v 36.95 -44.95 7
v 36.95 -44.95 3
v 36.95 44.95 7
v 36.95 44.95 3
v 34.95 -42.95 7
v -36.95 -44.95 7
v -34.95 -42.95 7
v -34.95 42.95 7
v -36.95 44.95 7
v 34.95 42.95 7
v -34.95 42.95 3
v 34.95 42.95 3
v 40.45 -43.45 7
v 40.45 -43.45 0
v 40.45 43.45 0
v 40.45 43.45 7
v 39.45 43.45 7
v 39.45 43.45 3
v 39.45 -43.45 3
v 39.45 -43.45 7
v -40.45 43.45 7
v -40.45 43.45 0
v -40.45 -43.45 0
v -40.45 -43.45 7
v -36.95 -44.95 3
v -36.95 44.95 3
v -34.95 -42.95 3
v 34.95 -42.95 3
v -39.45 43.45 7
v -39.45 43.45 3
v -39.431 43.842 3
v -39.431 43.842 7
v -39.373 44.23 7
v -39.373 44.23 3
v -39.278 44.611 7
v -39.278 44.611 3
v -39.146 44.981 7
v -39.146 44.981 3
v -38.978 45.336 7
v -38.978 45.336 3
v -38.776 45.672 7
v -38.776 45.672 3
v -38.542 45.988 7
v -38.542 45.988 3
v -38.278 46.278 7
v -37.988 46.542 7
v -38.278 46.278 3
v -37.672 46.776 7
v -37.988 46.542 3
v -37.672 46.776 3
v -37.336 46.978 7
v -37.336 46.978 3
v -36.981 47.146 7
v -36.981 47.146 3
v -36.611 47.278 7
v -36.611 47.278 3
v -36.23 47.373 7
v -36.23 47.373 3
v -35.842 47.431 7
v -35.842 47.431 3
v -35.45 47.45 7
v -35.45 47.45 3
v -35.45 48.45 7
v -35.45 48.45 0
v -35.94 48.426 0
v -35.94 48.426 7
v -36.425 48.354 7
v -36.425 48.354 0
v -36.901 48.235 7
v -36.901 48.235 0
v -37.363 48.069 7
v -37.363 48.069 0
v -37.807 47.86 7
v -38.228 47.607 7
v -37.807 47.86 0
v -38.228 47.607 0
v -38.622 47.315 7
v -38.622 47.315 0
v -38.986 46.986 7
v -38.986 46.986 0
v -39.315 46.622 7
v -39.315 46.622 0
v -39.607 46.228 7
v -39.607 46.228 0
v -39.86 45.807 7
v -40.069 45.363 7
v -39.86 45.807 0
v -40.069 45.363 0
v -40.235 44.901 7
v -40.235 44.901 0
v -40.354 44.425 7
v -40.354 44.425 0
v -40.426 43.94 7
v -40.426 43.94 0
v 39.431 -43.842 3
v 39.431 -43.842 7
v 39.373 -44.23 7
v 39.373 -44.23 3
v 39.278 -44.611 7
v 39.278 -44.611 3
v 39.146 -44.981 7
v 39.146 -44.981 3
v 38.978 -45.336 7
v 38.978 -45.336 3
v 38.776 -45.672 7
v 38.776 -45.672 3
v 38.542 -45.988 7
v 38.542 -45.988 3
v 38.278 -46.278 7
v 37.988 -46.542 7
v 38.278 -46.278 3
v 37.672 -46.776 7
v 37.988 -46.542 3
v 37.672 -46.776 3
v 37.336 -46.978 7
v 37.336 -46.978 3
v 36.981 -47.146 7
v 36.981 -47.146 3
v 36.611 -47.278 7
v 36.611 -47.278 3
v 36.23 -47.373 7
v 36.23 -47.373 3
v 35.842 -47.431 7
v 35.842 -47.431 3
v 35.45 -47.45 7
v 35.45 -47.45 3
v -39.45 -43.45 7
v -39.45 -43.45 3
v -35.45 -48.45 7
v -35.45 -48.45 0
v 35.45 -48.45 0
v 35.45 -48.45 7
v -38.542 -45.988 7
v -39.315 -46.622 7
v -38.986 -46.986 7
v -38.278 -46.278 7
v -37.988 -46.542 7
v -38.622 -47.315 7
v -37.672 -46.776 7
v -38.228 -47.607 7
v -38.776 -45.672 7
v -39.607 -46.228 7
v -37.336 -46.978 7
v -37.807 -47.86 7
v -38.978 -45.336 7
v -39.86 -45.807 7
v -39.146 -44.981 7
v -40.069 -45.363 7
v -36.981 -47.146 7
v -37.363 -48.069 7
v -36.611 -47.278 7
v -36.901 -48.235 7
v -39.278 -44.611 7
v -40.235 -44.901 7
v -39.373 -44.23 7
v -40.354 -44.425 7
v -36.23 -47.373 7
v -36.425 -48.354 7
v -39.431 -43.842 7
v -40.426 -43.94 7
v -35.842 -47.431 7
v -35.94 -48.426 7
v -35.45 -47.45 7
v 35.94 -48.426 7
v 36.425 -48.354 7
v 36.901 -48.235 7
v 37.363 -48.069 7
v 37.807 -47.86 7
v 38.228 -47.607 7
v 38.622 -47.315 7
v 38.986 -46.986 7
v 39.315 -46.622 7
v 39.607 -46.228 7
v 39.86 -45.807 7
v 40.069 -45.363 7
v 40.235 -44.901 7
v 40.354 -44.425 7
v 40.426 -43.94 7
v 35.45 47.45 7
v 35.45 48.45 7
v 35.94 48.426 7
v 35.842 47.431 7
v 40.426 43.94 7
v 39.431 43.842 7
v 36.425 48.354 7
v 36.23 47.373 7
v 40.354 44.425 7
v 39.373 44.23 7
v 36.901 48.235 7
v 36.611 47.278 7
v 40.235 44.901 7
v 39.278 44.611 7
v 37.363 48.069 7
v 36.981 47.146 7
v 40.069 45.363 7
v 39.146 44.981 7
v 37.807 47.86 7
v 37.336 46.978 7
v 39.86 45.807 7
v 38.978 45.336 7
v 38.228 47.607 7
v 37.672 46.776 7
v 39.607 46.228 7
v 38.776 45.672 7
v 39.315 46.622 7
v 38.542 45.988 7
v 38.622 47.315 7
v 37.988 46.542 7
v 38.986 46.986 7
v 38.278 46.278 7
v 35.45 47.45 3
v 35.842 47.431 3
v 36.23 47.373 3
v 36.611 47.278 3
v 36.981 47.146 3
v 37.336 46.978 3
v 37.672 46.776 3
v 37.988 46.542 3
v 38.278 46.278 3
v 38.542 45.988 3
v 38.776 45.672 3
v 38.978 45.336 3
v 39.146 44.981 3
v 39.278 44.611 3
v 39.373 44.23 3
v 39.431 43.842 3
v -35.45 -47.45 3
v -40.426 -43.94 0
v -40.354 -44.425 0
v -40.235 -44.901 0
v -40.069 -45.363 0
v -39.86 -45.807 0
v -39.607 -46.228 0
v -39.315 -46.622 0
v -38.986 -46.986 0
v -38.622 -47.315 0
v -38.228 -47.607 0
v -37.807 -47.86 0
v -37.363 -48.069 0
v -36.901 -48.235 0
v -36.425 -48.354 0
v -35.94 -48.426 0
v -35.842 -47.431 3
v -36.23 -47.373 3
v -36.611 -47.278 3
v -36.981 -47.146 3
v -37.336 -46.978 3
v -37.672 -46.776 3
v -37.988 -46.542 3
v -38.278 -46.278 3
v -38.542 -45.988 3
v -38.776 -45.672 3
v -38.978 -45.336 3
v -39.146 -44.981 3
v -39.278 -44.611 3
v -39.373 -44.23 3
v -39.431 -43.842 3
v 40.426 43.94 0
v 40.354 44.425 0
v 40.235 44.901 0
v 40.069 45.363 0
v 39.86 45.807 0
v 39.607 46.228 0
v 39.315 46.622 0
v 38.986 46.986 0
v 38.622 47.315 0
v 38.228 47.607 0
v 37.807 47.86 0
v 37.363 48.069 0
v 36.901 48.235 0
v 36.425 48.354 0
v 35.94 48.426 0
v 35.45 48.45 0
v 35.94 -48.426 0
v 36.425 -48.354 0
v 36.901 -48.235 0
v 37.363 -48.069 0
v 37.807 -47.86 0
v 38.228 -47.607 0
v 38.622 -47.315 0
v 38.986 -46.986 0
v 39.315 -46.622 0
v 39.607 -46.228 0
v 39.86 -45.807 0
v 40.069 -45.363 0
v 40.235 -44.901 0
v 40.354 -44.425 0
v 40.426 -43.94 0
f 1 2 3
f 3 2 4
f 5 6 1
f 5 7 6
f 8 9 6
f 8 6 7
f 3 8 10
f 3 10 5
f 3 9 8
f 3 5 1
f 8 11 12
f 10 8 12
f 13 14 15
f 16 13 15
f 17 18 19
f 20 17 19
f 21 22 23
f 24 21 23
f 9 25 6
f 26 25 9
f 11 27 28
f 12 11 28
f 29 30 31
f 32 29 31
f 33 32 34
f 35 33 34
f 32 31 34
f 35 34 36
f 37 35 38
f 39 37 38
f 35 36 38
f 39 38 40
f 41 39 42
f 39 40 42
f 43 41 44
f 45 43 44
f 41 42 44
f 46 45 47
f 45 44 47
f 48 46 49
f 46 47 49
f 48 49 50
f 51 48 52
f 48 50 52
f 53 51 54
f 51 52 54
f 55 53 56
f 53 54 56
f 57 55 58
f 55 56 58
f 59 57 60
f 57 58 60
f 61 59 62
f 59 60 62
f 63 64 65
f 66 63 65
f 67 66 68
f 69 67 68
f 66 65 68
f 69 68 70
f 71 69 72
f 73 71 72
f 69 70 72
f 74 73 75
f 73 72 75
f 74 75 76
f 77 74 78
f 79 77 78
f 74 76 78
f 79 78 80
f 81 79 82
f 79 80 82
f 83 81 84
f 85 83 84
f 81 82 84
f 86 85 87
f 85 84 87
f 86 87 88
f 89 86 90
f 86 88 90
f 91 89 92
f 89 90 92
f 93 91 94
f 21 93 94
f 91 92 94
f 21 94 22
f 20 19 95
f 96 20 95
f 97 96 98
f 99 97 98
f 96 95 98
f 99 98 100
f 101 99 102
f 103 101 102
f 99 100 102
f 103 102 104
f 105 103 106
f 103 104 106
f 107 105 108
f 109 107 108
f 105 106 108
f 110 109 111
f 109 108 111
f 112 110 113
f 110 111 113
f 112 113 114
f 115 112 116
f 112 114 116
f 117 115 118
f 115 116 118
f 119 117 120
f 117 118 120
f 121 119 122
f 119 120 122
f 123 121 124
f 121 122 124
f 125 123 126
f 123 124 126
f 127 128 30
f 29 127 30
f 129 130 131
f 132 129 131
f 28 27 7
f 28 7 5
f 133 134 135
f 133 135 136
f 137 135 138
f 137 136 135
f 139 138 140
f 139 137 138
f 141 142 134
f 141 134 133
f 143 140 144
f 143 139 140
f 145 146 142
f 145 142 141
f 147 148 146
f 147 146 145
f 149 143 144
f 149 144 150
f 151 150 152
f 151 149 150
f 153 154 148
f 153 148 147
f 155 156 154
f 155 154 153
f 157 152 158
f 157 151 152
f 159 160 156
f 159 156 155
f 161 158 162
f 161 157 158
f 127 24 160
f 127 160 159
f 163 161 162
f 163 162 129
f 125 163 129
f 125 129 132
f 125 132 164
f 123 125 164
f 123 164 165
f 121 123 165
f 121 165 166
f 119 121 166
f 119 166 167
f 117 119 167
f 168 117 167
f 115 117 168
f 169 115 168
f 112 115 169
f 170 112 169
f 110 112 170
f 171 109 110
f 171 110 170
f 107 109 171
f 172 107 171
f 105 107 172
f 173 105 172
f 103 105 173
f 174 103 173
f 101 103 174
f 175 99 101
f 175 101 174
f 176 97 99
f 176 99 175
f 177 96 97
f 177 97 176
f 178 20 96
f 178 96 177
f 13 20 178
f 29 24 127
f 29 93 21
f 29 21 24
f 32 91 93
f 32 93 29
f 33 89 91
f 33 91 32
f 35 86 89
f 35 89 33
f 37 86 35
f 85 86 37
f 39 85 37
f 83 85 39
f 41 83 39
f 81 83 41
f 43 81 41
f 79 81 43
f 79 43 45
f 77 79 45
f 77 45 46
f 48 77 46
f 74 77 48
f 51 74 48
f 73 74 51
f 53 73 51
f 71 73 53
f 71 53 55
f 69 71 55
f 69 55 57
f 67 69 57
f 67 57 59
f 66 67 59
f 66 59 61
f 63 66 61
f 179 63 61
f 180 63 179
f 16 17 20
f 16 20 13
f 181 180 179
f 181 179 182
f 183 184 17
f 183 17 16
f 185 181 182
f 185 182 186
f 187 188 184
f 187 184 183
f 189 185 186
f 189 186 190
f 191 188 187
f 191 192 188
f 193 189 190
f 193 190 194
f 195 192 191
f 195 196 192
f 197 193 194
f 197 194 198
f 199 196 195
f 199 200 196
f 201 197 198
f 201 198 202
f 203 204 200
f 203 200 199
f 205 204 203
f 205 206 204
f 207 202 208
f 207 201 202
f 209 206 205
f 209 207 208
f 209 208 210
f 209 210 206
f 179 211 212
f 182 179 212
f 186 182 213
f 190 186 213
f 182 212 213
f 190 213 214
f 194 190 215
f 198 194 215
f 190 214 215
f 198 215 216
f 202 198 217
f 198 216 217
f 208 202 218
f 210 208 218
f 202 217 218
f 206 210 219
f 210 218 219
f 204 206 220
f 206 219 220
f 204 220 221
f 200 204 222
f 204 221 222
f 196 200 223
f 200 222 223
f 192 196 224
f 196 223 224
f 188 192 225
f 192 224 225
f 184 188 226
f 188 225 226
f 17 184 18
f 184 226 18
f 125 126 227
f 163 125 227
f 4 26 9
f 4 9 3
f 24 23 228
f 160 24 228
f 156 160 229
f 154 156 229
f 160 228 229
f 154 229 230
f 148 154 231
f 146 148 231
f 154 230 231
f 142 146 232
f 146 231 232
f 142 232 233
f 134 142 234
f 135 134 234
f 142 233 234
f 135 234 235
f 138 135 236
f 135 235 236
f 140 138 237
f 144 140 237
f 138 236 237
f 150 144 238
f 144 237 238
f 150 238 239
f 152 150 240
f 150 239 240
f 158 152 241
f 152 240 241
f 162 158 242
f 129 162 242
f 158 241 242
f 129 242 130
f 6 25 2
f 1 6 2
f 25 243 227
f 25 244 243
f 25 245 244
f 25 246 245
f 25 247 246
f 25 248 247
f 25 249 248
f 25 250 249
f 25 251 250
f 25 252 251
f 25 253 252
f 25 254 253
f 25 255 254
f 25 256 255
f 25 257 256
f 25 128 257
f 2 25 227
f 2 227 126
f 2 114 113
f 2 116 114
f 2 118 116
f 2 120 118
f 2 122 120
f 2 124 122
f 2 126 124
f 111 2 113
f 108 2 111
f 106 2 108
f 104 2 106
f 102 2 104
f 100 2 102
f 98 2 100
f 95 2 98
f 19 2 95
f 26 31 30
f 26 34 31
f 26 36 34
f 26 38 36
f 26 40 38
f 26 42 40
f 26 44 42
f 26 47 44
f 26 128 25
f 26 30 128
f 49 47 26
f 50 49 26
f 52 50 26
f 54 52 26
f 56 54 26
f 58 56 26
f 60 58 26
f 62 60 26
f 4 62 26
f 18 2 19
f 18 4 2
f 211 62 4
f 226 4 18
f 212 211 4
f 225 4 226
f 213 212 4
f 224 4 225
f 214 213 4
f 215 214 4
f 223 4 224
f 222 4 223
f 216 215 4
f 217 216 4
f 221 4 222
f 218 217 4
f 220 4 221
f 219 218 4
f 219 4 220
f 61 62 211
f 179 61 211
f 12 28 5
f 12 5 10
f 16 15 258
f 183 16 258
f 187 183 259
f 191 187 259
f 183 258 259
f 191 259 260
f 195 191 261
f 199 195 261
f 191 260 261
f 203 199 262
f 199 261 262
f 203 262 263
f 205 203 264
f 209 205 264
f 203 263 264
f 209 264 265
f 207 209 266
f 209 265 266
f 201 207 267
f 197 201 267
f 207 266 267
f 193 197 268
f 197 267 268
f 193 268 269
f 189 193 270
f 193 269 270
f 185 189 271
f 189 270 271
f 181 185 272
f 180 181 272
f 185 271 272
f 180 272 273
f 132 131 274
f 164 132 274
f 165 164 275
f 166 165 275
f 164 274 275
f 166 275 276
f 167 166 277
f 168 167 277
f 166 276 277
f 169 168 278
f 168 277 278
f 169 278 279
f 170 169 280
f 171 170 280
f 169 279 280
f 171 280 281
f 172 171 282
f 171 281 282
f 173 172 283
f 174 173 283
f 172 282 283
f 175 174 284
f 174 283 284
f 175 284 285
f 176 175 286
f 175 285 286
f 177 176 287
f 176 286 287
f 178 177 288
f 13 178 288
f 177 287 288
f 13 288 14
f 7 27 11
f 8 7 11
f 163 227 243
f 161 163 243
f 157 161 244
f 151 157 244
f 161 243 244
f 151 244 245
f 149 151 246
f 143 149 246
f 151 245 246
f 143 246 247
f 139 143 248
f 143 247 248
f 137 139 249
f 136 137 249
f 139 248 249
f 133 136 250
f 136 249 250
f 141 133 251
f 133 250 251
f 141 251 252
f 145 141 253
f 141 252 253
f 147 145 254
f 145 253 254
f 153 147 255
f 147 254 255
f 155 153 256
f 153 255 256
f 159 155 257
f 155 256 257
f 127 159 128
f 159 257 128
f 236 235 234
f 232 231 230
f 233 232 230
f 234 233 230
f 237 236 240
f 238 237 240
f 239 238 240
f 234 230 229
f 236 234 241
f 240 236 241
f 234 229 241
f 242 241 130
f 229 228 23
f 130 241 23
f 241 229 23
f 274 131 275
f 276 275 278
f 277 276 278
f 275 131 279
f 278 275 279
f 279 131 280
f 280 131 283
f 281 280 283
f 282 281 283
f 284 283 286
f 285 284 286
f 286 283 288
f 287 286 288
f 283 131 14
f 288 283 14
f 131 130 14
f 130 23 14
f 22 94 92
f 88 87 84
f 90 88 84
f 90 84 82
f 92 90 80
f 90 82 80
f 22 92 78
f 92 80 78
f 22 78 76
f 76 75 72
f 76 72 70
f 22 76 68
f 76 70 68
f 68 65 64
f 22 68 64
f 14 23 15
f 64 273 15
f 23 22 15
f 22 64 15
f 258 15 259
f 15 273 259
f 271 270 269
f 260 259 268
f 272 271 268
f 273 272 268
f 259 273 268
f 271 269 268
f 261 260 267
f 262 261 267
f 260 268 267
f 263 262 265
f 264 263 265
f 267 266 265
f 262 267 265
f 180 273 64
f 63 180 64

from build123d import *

# Parameters (mm, degrees)
F0_W     = 73.9
F0_H     = 89.9
F0_W_2   = 69.9
F0_H_2   = 85.9
F1_DEPTH = 3
F2_DEPTH = 7
F3_DEPTH = 7


with BuildPart() as f1:
    # F0 (on Top) → F1 (new body)
    with BuildSketch(Plane.XY):
        with BuildLine():
            Line((40.45, -43.45), (40.45, 43.45))
            ThreePointArc((40.45, 43.45), (38.9855339059, 46.9855339059), (35.45, 48.45))
            Line((35.45, 48.45), (-35.45, 48.45))
            ThreePointArc((-35.45, 48.45), (-38.9855339059, 46.9855339059), (-40.45, 43.45))
            Line((-40.45, 43.45), (-40.45, -43.45))
            ThreePointArc((-40.45, -43.45), (-38.9855339059, -46.9855339059), (-35.45, -48.45))
            Line((-35.45, -48.45), (35.45, -48.45))
            ThreePointArc((35.45, -48.45), (38.9855339059, -46.9855339059), (40.45, -43.45))
        make_face()
        with BuildLine():
            ThreePointArc((-39.45, 43.45), (-38.2784271247, 46.2784271247), (-35.45, 47.45))
            Line((-35.45, 47.45), (35.45, 47.45))
            ThreePointArc((35.45, 47.45), (38.2784271247, 46.2784271247), (39.45, 43.45))
            Line((39.45, 43.45), (39.45, -43.45))
            ThreePointArc((39.45, -43.45), (38.2784271247, -46.2784271247), (35.45, -47.45))
            Line((35.45, -47.45), (-35.45, -47.45))
            ThreePointArc((-35.45, -47.45), (-38.2784271247, -46.2784271247), (-39.45, -43.45))
            Line((-39.45, -43.45), (-39.45, 43.45))
        make_face(mode=Mode.SUBTRACT)
        with BuildLine():
            Line((35.45, 47.45), (-35.45, 47.45))
            ThreePointArc((-35.45, 47.45), (-38.2784271247, 46.2784271247), (-39.45, 43.45))
            Line((-39.45, 43.45), (-39.45, -43.45))
            ThreePointArc((-39.45, -43.45), (-38.2784271247, -46.2784271247), (-35.45, -47.45))
            Line((-35.45, -47.45), (35.45, -47.45))
            ThreePointArc((35.45, -47.45), (38.2784271247, -46.2784271247), (39.45, -43.45))
            Line((39.45, -43.45), (39.45, 43.45))
            ThreePointArc((39.45, 43.45), (38.2784271247, 46.2784271247), (35.45, 47.45))
        make_face()
        Rectangle(F0_W, F0_H, mode=Mode.SUBTRACT)
        Rectangle(F0_W, F0_H)
        Rectangle(F0_W_2, F0_H_2, mode=Mode.SUBTRACT)
        Rectangle(F0_W_2, F0_H_2)
    extrude(amount=F1_DEPTH)

    # F0 (on Top) → F2 (join)
    with BuildSketch(Plane.XY):
        with BuildLine():
            Line((40.45, -43.45), (40.45, 43.45))
            ThreePointArc((40.45, 43.45), (38.9855339059, 46.9855339059), (35.45, 48.45))
            Line((35.45, 48.45), (-35.45, 48.45))
            ThreePointArc((-35.45, 48.45), (-38.9855339059, 46.9855339059), (-40.45, 43.45))
            Line((-40.45, 43.45), (-40.45, -43.45))
            ThreePointArc((-40.45, -43.45), (-38.9855339059, -46.9855339059), (-35.45, -48.45))
            Line((-35.45, -48.45), (35.45, -48.45))
            ThreePointArc((35.45, -48.45), (38.9855339059, -46.9855339059), (40.45, -43.45))
        make_face()
        with BuildLine():
            ThreePointArc((-39.45, 43.45), (-38.2784271247, 46.2784271247), (-35.45, 47.45))
            Line((-35.45, 47.45), (35.45, 47.45))
            ThreePointArc((35.45, 47.45), (38.2784271247, 46.2784271247), (39.45, 43.45))
            Line((39.45, 43.45), (39.45, -43.45))
            ThreePointArc((39.45, -43.45), (38.2784271247, -46.2784271247), (35.45, -47.45))
            Line((35.45, -47.45), (-35.45, -47.45))
            ThreePointArc((-35.45, -47.45), (-38.2784271247, -46.2784271247), (-39.45, -43.45))
            Line((-39.45, -43.45), (-39.45, 43.45))
        make_face(mode=Mode.SUBTRACT)
    extrude(amount=F2_DEPTH)

    # F0 (on Top) → F3 (join)
    with BuildSketch(Plane.XY):
        Rectangle(F0_W, F0_H)
        Rectangle(F0_W_2, F0_H_2, mode=Mode.SUBTRACT)
    extrude(amount=F3_DEPTH)


solid = f1.part
